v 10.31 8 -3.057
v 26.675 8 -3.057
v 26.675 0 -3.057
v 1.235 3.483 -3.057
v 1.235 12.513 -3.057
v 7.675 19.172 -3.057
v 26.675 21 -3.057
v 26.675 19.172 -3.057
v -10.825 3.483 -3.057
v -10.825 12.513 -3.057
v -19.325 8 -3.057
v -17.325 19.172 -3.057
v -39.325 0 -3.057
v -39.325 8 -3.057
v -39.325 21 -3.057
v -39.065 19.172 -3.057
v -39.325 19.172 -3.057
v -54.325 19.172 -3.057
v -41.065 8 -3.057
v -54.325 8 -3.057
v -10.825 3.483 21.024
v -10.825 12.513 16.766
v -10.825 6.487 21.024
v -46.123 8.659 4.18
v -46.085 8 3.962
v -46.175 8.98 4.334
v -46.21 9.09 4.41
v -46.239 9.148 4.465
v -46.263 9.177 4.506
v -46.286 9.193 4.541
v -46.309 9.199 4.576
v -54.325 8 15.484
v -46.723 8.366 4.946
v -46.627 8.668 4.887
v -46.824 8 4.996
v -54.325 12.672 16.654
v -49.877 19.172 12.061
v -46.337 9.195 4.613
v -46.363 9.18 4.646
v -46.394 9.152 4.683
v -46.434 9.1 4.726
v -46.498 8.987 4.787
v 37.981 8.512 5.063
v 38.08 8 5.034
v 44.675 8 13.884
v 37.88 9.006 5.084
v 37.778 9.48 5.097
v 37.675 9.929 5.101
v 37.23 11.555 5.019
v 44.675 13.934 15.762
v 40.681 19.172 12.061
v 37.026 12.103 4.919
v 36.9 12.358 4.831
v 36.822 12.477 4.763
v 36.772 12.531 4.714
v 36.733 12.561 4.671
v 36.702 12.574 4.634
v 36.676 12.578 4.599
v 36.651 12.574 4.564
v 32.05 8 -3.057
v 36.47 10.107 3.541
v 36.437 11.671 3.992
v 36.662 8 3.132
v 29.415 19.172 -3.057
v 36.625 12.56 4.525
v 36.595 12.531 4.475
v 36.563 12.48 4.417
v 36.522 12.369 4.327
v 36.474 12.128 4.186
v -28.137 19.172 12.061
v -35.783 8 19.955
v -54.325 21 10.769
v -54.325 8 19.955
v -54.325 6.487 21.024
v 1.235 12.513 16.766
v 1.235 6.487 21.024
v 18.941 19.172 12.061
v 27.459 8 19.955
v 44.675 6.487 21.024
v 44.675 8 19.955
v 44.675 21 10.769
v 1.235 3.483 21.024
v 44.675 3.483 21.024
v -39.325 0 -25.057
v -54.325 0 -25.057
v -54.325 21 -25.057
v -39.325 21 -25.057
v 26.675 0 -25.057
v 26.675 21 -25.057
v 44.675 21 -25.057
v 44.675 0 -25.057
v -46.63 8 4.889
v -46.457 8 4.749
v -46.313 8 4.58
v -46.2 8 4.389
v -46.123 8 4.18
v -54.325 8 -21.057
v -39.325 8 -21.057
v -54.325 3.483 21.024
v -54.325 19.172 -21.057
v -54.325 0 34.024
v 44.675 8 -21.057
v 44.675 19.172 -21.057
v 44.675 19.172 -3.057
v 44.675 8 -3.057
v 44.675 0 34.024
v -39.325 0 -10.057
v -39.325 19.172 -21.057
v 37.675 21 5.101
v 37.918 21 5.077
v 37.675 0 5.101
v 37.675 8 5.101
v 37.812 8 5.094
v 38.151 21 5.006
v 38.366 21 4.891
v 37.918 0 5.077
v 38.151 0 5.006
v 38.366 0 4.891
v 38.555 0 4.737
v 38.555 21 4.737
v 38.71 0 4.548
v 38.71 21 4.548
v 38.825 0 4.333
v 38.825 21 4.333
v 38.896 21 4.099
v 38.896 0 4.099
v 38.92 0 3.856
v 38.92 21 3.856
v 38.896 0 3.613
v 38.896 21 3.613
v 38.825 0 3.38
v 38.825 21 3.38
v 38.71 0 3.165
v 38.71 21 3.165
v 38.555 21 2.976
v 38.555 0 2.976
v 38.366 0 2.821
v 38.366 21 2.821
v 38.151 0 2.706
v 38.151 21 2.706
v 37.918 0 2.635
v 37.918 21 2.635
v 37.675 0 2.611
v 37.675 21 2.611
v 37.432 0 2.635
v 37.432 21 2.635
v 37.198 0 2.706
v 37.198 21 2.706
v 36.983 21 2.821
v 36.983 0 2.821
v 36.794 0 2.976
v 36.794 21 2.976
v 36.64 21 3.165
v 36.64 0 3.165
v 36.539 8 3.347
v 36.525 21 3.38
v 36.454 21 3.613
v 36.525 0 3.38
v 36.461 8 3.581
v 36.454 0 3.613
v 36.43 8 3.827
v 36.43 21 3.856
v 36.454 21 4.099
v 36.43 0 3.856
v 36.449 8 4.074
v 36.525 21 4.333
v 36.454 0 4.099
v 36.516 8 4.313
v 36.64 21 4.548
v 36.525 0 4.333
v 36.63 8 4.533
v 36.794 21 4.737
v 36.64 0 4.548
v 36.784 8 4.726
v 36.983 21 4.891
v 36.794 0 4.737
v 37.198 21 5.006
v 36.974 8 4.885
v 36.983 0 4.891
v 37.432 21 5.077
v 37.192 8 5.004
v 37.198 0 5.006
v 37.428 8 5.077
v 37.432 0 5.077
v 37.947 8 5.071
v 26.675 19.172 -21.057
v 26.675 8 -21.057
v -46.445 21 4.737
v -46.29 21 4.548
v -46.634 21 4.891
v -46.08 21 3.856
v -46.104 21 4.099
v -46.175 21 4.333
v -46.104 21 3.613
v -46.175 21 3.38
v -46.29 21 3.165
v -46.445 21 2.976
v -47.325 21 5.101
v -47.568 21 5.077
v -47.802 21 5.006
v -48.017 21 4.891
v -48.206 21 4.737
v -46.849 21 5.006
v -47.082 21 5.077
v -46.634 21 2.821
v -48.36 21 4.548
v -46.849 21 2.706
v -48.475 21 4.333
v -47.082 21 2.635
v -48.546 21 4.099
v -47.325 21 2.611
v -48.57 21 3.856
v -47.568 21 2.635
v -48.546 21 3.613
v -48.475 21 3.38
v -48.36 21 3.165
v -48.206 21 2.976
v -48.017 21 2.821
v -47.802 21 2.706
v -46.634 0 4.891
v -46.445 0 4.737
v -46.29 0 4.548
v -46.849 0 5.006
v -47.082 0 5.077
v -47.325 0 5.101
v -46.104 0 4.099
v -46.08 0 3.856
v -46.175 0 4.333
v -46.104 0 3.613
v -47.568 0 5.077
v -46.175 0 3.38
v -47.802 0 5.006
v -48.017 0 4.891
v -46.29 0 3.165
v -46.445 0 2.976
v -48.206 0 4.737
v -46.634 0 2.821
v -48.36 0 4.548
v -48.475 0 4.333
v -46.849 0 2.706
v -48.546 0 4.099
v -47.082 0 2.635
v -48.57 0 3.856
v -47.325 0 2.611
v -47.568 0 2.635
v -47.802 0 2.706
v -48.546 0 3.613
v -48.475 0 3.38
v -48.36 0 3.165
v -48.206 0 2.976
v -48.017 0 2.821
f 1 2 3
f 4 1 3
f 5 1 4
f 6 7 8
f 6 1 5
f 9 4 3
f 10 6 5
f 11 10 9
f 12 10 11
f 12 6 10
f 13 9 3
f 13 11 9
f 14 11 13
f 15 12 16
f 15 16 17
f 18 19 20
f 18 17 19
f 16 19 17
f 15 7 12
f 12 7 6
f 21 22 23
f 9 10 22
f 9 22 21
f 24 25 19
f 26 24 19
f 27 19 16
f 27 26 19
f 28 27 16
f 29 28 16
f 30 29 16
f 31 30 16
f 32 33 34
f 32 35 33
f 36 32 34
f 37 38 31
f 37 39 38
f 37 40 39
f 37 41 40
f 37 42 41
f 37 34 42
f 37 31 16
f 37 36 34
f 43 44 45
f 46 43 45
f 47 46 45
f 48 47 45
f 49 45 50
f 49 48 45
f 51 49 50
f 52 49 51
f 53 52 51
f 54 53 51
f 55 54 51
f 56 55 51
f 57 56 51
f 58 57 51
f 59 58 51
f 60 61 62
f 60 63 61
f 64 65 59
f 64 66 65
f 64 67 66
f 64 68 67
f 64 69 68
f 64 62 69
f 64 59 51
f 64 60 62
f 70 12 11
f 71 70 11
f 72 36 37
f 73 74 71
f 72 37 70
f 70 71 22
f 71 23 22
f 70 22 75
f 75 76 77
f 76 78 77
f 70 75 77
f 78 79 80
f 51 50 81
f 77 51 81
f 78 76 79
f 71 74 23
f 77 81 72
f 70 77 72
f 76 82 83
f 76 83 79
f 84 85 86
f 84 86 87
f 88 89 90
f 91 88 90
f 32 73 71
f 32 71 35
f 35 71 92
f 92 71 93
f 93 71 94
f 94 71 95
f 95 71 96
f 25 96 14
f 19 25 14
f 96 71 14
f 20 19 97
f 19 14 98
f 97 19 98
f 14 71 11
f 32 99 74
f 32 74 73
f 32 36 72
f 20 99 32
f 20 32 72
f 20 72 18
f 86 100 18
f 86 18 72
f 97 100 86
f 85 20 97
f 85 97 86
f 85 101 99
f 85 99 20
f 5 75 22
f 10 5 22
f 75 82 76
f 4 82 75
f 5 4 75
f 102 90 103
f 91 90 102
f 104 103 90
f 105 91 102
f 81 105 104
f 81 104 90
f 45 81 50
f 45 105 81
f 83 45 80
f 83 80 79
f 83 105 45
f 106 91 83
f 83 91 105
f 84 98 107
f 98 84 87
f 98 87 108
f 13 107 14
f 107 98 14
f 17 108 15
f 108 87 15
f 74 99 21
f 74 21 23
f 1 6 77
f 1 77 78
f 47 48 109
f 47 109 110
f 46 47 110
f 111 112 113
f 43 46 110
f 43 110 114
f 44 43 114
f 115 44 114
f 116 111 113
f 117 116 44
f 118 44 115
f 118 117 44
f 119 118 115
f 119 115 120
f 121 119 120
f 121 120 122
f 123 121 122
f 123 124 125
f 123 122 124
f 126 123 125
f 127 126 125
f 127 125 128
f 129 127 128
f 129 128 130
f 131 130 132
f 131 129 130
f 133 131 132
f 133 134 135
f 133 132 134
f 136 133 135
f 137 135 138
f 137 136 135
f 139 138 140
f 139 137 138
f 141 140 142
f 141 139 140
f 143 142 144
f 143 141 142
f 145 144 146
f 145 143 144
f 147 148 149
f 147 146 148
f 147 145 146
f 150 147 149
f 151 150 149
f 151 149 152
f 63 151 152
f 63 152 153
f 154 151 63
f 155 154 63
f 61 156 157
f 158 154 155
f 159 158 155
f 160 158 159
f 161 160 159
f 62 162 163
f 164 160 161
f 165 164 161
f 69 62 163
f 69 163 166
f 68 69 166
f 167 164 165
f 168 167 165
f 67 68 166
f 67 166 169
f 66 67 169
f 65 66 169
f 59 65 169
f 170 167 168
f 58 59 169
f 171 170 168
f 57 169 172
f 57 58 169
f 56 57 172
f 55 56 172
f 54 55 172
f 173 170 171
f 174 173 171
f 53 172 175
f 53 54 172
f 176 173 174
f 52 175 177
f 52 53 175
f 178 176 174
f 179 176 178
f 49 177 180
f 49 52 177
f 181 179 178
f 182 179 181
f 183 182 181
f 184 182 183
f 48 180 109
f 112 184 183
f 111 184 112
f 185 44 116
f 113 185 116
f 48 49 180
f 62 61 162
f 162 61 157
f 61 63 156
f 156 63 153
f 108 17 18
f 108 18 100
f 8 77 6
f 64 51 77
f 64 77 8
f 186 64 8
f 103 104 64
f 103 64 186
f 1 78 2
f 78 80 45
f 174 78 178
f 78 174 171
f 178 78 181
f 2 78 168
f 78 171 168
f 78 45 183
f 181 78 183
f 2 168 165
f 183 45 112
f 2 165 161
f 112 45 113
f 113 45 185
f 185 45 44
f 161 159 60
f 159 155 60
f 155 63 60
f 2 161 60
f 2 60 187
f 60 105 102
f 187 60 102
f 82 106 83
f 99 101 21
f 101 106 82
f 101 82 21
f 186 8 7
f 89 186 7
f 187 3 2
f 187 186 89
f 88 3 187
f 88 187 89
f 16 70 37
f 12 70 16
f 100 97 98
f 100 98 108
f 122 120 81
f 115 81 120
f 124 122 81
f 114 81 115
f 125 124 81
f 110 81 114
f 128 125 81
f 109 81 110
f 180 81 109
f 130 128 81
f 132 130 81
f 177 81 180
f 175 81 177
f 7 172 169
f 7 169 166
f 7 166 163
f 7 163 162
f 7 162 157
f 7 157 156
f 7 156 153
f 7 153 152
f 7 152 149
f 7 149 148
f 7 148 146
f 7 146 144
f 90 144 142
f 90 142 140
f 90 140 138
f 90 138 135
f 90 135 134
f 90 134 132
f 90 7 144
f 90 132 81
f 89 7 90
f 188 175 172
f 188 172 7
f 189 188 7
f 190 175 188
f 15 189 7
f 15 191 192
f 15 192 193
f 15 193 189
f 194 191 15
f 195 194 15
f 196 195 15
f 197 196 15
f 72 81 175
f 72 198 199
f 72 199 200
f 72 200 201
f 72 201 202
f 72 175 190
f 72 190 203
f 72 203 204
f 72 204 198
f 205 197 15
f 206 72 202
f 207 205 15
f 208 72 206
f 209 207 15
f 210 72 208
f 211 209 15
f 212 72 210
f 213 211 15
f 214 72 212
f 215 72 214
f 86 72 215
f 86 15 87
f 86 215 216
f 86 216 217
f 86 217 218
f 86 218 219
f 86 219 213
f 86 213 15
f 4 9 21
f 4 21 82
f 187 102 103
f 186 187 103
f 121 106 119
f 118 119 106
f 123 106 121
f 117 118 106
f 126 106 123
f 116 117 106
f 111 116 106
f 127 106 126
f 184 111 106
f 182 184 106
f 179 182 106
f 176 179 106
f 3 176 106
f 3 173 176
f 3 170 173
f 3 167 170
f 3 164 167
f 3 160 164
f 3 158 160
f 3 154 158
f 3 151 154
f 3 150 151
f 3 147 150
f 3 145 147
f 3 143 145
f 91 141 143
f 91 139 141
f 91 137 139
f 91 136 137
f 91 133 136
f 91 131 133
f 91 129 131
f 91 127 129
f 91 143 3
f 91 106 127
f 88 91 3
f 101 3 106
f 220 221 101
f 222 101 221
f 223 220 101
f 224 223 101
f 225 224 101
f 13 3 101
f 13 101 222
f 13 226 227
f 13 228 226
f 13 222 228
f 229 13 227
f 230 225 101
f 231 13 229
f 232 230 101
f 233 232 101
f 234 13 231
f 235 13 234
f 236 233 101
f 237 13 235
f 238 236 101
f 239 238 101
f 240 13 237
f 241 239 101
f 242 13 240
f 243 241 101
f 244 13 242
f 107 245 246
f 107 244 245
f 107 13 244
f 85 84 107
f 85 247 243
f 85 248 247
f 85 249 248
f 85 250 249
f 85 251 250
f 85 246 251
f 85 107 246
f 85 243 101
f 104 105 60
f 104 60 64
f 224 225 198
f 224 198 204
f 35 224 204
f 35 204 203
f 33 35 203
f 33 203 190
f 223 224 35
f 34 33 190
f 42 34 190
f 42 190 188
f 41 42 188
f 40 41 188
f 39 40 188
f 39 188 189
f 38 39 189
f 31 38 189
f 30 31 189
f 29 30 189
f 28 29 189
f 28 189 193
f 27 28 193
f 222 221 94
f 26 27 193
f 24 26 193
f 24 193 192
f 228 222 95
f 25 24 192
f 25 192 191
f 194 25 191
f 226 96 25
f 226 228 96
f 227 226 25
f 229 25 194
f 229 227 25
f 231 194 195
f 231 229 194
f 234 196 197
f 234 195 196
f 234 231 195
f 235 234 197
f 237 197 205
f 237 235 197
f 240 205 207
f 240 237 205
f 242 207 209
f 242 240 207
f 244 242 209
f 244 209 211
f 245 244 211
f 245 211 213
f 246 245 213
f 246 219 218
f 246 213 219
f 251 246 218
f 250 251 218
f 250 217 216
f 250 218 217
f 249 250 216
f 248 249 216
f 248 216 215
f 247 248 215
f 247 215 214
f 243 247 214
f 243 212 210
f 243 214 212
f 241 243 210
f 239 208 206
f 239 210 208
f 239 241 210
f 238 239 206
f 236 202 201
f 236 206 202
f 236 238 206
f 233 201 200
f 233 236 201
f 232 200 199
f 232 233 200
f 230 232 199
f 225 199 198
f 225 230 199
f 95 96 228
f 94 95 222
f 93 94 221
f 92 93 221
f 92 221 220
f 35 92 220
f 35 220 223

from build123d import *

# Parameters (mm, degrees)
BOSS_EXTRUDE2_DEPTH        = 25
SKETCH4_W                  = 18
SKETCH4_H                  = 11.172071032
CUT_EXTRUDE1_DEPTH         = 110.64235231
CUT_SWEEP3_START           = -47.833237702
CUT_SWEEP3_DEPTH           = 40.241500367
CUT_SWEEP4_START           = 2.134725454
CUT_SWEEP4_DEPTH           = 40.561080438
SKETCH24_W                 = 3
SKETCH24_H                 = 22.191771217
CUT_EXTRUDE15_DEPTH        = 15
CORTAR_EXTRUIR1_DEPTH      = 110.64235231
CORTAR_EXTRUIR1_DEPTH_BACK = 110.64235231
CORTAR_EXTRUIR2_DEPTH      = 110.64235231
CORTAR_EXTRUIR2_DEPTH_BACK = 110.64235231
CORTAR_EXTRUIR3_DEPTH      = 76.49647267
CORTAR_EXTRUIR3_DEPTH_BACK = 76.49647267
CORTAR_EXTRUIR4_DEPTH      = 108.627401408
CORTAR_EXTRUIR4_DEPTH_BACK = 108.627401408
CORTAR_EXTRUIR7_DEPTH      = 68.452835826
CORTAR_EXTRUIR7_DEPTH_BACK = 68.452835826
CROQUIS9_R                 = 1.245
CORTAR_EXTRUIR6_DEPTH      = 67.906302907
CORTAR_EXTRUIR6_DEPTH_BACK = 10


# Read off the part's stored shape, not the designer's step: Cut-Sweep3, Cut-Sweep4
with BuildPart() as part:
    # Sketch1 → Boss-Extrude2 (new body)
    with BuildSketch(Plane(origin=(0, 0, 0), x_dir=(1, 0, 0), z_dir=(0, 1, 0))):
        Polygon((26.674798416, 25.056972824), (44.674798416, 25.056972824), (44.674798416, -39.943027176), (-54.325201584, -39.943027176), (-54.325201584, 25.056972824), (-36.325201584, 25.056972824), (-36.325201584, 10.056972824), (26.674798416, 10.056972824), align=None)
    extrude(amount=BOSS_EXTRUDE2_DEPTH)

    # Sketch4 → Cut-Extrude1 (cut, through all)
    with BuildSketch(Plane(origin=(44.674798416, 0, 0), x_dir=(0, 0, -1), z_dir=(1, 0, 0))):
        Polygon((-39.943027176, 25), (-39.943027176, 0), (-21.024366767, 6.487240423), (-7.943027176, 25), align=None)
        with Locations((12.056972824, 13.586035516)):
            Rectangle(SKETCH4_W, SKETCH4_H)
    extrude(amount=-CUT_EXTRUDE1_DEPTH, mode=Mode.SUBTRACT)

    # Cut-Sweep3 outline → Cut-Sweep3 (cut)
    with BuildSketch(Plane(origin=(0, 0, 0), x_dir=(0.8133953590059209, 0, 0.5817112599457132), z_dir=(0.5817112599457132, 0, -0.8133953590059209)).offset(CUT_SWEEP3_START)):
        Polygon((-17.497304793, -8), (-35.180519898, -8), (-33.55372918, -19.172071032), (-15.870514075, -19.172071032), align=None)
    extrude(amount=CUT_SWEEP3_DEPTH, mode=Mode.SUBTRACT)

    # Cut-Sweep4 outline → Cut-Sweep4 (cut)
    with BuildSketch(Plane(origin=(0, 0, 0), x_dir=(0.8018445876826973, 0, -0.5975326411201026), z_dir=(0.5975326411201026, 0, 0.8018445876826972)).offset(CUT_SWEEP4_START)):
        Polygon((10.094047266, 8), (27.526148602, 8), (25.412737953, 19.172071032), (7.980636617, 19.172071032), align=None)
    extrude(amount=CUT_SWEEP4_DEPTH, mode=Mode.SUBTRACT)

    # Sketch24 → Cut-Extrude15 (cut)
    with BuildSketch(Plane(origin=(0, 0, -25.056972824), x_dir=(-1, 0, 0), z_dir=(0, 0, -1))):
        with Locations((37.825201584, 11.095885609)):
            Rectangle(SKETCH24_W, SKETCH24_H)
    extrude(amount=-CUT_EXTRUDE15_DEPTH, mode=Mode.SUBTRACT)

    # Croquis2 → Cortar-Extruir1 (cut, two sides: drawn at the far end of the back side and taken through both)
    with BuildSketch(Plane(origin=(44.674798416, 0, 0), x_dir=(0, 0, -1), z_dir=(1, 0, 0)).offset(-CORTAR_EXTRUIR1_DEPTH_BACK)):
        Polygon((-21.024366767, 5.069239779), (-21.024366767, 6.487240423), (-39.943027176, 0), align=None)
    extrude(amount=CORTAR_EXTRUIR1_DEPTH + CORTAR_EXTRUIR1_DEPTH_BACK, mode=Mode.SUBTRACT)

    # Croquis3 → Cortar-Extruir2 (cut, two sides: drawn at the far end of the back side and taken through both)
    with BuildSketch(Plane(origin=(44.674798416, 0, 0), x_dir=(0, 0, -1), z_dir=(1, 0, 0)).offset(-CORTAR_EXTRUIR2_DEPTH_BACK)):
        Polygon((-21.024366767, 3.483339502), (-21.024366767, 5.069239779), (-39.943027176, 0), (-34.024366767, 0), align=None)
    extrude(amount=CORTAR_EXTRUIR2_DEPTH + CORTAR_EXTRUIR2_DEPTH_BACK, mode=Mode.SUBTRACT)

    # Croquis4 → Cortar-Extruir3 (cut, two sides: drawn at the far end of the back side and taken through both)
    with BuildSketch(Plane.XY.offset(21.024366767).offset(-CORTAR_EXTRUIR3_DEPTH_BACK)):
        Polygon((-4.825201584, 3.483339502), (1.234798416, 3.483339502), (1.234798416, 12.513339502), (-4.795201584, 12.513339502), (-10.825201584, 12.513339502), (-10.825201584, 3.483339502), align=None)
    extrude(amount=CORTAR_EXTRUIR3_DEPTH + CORTAR_EXTRUIR3_DEPTH_BACK, mode=Mode.SUBTRACT)

    # Croquis5 → Cortar-Extruir4 (cut, two sides: drawn at the far end of the back side and taken through both)
    with BuildSketch(Plane(origin=(44.674798416, 0, 0), x_dir=(0, 0, -1), z_dir=(1, 0, 0)).offset(-CORTAR_EXTRUIR4_DEPTH_BACK)):
        Polygon((-10.769475505, 21), (-7.943027176, 21), (25.056972824, 21), (25.056972824, 25), (-7.943027176, 25), align=None)
    extrude(amount=CORTAR_EXTRUIR4_DEPTH + CORTAR_EXTRUIR4_DEPTH_BACK, mode=Mode.SUBTRACT)

    # Croquis9 → Cortar-Extruir7 (cut, two sides: drawn at the far end of the back side and taken through both)
    with BuildSketch(Plane(origin=(0, 21, 0), x_dir=(1, 0, 0), z_dir=(0, 1, 0)).offset(-CORTAR_EXTRUIR7_DEPTH_BACK)):
        with Locations(Location((-47.325201584, -3.856251341, 0), (0, 0, 270))):
            Circle(CROQUIS9_R)
        with Locations(Location((37.674798416, -3.856251341, 0), (0, 0, 270))):
            Circle(CROQUIS9_R)
    extrude(amount=CORTAR_EXTRUIR7_DEPTH + CORTAR_EXTRUIR7_DEPTH_BACK, mode=Mode.SUBTRACT)

    # Croquis7 → Cortar-Extruir6 (cut, two sides: drawn at the far end of the back side and taken through both)
    with BuildSketch(Plane.XZ.offset(-19.172071032).offset(-CORTAR_EXTRUIR6_DEPTH_BACK)):
        Polygon((-4.825201584, -3.056972824), (26.674798416, -3.056972824), (26.674798416, -10.056972824), (-4.825201584, -10.056972824), (-39.325201584, -10.056972824), (-39.325201584, -3.056972824), align=None)
    extrude(amount=CORTAR_EXTRUIR6_DEPTH + CORTAR_EXTRUIR6_DEPTH_BACK, mode=Mode.SUBTRACT)


solid = part.part
